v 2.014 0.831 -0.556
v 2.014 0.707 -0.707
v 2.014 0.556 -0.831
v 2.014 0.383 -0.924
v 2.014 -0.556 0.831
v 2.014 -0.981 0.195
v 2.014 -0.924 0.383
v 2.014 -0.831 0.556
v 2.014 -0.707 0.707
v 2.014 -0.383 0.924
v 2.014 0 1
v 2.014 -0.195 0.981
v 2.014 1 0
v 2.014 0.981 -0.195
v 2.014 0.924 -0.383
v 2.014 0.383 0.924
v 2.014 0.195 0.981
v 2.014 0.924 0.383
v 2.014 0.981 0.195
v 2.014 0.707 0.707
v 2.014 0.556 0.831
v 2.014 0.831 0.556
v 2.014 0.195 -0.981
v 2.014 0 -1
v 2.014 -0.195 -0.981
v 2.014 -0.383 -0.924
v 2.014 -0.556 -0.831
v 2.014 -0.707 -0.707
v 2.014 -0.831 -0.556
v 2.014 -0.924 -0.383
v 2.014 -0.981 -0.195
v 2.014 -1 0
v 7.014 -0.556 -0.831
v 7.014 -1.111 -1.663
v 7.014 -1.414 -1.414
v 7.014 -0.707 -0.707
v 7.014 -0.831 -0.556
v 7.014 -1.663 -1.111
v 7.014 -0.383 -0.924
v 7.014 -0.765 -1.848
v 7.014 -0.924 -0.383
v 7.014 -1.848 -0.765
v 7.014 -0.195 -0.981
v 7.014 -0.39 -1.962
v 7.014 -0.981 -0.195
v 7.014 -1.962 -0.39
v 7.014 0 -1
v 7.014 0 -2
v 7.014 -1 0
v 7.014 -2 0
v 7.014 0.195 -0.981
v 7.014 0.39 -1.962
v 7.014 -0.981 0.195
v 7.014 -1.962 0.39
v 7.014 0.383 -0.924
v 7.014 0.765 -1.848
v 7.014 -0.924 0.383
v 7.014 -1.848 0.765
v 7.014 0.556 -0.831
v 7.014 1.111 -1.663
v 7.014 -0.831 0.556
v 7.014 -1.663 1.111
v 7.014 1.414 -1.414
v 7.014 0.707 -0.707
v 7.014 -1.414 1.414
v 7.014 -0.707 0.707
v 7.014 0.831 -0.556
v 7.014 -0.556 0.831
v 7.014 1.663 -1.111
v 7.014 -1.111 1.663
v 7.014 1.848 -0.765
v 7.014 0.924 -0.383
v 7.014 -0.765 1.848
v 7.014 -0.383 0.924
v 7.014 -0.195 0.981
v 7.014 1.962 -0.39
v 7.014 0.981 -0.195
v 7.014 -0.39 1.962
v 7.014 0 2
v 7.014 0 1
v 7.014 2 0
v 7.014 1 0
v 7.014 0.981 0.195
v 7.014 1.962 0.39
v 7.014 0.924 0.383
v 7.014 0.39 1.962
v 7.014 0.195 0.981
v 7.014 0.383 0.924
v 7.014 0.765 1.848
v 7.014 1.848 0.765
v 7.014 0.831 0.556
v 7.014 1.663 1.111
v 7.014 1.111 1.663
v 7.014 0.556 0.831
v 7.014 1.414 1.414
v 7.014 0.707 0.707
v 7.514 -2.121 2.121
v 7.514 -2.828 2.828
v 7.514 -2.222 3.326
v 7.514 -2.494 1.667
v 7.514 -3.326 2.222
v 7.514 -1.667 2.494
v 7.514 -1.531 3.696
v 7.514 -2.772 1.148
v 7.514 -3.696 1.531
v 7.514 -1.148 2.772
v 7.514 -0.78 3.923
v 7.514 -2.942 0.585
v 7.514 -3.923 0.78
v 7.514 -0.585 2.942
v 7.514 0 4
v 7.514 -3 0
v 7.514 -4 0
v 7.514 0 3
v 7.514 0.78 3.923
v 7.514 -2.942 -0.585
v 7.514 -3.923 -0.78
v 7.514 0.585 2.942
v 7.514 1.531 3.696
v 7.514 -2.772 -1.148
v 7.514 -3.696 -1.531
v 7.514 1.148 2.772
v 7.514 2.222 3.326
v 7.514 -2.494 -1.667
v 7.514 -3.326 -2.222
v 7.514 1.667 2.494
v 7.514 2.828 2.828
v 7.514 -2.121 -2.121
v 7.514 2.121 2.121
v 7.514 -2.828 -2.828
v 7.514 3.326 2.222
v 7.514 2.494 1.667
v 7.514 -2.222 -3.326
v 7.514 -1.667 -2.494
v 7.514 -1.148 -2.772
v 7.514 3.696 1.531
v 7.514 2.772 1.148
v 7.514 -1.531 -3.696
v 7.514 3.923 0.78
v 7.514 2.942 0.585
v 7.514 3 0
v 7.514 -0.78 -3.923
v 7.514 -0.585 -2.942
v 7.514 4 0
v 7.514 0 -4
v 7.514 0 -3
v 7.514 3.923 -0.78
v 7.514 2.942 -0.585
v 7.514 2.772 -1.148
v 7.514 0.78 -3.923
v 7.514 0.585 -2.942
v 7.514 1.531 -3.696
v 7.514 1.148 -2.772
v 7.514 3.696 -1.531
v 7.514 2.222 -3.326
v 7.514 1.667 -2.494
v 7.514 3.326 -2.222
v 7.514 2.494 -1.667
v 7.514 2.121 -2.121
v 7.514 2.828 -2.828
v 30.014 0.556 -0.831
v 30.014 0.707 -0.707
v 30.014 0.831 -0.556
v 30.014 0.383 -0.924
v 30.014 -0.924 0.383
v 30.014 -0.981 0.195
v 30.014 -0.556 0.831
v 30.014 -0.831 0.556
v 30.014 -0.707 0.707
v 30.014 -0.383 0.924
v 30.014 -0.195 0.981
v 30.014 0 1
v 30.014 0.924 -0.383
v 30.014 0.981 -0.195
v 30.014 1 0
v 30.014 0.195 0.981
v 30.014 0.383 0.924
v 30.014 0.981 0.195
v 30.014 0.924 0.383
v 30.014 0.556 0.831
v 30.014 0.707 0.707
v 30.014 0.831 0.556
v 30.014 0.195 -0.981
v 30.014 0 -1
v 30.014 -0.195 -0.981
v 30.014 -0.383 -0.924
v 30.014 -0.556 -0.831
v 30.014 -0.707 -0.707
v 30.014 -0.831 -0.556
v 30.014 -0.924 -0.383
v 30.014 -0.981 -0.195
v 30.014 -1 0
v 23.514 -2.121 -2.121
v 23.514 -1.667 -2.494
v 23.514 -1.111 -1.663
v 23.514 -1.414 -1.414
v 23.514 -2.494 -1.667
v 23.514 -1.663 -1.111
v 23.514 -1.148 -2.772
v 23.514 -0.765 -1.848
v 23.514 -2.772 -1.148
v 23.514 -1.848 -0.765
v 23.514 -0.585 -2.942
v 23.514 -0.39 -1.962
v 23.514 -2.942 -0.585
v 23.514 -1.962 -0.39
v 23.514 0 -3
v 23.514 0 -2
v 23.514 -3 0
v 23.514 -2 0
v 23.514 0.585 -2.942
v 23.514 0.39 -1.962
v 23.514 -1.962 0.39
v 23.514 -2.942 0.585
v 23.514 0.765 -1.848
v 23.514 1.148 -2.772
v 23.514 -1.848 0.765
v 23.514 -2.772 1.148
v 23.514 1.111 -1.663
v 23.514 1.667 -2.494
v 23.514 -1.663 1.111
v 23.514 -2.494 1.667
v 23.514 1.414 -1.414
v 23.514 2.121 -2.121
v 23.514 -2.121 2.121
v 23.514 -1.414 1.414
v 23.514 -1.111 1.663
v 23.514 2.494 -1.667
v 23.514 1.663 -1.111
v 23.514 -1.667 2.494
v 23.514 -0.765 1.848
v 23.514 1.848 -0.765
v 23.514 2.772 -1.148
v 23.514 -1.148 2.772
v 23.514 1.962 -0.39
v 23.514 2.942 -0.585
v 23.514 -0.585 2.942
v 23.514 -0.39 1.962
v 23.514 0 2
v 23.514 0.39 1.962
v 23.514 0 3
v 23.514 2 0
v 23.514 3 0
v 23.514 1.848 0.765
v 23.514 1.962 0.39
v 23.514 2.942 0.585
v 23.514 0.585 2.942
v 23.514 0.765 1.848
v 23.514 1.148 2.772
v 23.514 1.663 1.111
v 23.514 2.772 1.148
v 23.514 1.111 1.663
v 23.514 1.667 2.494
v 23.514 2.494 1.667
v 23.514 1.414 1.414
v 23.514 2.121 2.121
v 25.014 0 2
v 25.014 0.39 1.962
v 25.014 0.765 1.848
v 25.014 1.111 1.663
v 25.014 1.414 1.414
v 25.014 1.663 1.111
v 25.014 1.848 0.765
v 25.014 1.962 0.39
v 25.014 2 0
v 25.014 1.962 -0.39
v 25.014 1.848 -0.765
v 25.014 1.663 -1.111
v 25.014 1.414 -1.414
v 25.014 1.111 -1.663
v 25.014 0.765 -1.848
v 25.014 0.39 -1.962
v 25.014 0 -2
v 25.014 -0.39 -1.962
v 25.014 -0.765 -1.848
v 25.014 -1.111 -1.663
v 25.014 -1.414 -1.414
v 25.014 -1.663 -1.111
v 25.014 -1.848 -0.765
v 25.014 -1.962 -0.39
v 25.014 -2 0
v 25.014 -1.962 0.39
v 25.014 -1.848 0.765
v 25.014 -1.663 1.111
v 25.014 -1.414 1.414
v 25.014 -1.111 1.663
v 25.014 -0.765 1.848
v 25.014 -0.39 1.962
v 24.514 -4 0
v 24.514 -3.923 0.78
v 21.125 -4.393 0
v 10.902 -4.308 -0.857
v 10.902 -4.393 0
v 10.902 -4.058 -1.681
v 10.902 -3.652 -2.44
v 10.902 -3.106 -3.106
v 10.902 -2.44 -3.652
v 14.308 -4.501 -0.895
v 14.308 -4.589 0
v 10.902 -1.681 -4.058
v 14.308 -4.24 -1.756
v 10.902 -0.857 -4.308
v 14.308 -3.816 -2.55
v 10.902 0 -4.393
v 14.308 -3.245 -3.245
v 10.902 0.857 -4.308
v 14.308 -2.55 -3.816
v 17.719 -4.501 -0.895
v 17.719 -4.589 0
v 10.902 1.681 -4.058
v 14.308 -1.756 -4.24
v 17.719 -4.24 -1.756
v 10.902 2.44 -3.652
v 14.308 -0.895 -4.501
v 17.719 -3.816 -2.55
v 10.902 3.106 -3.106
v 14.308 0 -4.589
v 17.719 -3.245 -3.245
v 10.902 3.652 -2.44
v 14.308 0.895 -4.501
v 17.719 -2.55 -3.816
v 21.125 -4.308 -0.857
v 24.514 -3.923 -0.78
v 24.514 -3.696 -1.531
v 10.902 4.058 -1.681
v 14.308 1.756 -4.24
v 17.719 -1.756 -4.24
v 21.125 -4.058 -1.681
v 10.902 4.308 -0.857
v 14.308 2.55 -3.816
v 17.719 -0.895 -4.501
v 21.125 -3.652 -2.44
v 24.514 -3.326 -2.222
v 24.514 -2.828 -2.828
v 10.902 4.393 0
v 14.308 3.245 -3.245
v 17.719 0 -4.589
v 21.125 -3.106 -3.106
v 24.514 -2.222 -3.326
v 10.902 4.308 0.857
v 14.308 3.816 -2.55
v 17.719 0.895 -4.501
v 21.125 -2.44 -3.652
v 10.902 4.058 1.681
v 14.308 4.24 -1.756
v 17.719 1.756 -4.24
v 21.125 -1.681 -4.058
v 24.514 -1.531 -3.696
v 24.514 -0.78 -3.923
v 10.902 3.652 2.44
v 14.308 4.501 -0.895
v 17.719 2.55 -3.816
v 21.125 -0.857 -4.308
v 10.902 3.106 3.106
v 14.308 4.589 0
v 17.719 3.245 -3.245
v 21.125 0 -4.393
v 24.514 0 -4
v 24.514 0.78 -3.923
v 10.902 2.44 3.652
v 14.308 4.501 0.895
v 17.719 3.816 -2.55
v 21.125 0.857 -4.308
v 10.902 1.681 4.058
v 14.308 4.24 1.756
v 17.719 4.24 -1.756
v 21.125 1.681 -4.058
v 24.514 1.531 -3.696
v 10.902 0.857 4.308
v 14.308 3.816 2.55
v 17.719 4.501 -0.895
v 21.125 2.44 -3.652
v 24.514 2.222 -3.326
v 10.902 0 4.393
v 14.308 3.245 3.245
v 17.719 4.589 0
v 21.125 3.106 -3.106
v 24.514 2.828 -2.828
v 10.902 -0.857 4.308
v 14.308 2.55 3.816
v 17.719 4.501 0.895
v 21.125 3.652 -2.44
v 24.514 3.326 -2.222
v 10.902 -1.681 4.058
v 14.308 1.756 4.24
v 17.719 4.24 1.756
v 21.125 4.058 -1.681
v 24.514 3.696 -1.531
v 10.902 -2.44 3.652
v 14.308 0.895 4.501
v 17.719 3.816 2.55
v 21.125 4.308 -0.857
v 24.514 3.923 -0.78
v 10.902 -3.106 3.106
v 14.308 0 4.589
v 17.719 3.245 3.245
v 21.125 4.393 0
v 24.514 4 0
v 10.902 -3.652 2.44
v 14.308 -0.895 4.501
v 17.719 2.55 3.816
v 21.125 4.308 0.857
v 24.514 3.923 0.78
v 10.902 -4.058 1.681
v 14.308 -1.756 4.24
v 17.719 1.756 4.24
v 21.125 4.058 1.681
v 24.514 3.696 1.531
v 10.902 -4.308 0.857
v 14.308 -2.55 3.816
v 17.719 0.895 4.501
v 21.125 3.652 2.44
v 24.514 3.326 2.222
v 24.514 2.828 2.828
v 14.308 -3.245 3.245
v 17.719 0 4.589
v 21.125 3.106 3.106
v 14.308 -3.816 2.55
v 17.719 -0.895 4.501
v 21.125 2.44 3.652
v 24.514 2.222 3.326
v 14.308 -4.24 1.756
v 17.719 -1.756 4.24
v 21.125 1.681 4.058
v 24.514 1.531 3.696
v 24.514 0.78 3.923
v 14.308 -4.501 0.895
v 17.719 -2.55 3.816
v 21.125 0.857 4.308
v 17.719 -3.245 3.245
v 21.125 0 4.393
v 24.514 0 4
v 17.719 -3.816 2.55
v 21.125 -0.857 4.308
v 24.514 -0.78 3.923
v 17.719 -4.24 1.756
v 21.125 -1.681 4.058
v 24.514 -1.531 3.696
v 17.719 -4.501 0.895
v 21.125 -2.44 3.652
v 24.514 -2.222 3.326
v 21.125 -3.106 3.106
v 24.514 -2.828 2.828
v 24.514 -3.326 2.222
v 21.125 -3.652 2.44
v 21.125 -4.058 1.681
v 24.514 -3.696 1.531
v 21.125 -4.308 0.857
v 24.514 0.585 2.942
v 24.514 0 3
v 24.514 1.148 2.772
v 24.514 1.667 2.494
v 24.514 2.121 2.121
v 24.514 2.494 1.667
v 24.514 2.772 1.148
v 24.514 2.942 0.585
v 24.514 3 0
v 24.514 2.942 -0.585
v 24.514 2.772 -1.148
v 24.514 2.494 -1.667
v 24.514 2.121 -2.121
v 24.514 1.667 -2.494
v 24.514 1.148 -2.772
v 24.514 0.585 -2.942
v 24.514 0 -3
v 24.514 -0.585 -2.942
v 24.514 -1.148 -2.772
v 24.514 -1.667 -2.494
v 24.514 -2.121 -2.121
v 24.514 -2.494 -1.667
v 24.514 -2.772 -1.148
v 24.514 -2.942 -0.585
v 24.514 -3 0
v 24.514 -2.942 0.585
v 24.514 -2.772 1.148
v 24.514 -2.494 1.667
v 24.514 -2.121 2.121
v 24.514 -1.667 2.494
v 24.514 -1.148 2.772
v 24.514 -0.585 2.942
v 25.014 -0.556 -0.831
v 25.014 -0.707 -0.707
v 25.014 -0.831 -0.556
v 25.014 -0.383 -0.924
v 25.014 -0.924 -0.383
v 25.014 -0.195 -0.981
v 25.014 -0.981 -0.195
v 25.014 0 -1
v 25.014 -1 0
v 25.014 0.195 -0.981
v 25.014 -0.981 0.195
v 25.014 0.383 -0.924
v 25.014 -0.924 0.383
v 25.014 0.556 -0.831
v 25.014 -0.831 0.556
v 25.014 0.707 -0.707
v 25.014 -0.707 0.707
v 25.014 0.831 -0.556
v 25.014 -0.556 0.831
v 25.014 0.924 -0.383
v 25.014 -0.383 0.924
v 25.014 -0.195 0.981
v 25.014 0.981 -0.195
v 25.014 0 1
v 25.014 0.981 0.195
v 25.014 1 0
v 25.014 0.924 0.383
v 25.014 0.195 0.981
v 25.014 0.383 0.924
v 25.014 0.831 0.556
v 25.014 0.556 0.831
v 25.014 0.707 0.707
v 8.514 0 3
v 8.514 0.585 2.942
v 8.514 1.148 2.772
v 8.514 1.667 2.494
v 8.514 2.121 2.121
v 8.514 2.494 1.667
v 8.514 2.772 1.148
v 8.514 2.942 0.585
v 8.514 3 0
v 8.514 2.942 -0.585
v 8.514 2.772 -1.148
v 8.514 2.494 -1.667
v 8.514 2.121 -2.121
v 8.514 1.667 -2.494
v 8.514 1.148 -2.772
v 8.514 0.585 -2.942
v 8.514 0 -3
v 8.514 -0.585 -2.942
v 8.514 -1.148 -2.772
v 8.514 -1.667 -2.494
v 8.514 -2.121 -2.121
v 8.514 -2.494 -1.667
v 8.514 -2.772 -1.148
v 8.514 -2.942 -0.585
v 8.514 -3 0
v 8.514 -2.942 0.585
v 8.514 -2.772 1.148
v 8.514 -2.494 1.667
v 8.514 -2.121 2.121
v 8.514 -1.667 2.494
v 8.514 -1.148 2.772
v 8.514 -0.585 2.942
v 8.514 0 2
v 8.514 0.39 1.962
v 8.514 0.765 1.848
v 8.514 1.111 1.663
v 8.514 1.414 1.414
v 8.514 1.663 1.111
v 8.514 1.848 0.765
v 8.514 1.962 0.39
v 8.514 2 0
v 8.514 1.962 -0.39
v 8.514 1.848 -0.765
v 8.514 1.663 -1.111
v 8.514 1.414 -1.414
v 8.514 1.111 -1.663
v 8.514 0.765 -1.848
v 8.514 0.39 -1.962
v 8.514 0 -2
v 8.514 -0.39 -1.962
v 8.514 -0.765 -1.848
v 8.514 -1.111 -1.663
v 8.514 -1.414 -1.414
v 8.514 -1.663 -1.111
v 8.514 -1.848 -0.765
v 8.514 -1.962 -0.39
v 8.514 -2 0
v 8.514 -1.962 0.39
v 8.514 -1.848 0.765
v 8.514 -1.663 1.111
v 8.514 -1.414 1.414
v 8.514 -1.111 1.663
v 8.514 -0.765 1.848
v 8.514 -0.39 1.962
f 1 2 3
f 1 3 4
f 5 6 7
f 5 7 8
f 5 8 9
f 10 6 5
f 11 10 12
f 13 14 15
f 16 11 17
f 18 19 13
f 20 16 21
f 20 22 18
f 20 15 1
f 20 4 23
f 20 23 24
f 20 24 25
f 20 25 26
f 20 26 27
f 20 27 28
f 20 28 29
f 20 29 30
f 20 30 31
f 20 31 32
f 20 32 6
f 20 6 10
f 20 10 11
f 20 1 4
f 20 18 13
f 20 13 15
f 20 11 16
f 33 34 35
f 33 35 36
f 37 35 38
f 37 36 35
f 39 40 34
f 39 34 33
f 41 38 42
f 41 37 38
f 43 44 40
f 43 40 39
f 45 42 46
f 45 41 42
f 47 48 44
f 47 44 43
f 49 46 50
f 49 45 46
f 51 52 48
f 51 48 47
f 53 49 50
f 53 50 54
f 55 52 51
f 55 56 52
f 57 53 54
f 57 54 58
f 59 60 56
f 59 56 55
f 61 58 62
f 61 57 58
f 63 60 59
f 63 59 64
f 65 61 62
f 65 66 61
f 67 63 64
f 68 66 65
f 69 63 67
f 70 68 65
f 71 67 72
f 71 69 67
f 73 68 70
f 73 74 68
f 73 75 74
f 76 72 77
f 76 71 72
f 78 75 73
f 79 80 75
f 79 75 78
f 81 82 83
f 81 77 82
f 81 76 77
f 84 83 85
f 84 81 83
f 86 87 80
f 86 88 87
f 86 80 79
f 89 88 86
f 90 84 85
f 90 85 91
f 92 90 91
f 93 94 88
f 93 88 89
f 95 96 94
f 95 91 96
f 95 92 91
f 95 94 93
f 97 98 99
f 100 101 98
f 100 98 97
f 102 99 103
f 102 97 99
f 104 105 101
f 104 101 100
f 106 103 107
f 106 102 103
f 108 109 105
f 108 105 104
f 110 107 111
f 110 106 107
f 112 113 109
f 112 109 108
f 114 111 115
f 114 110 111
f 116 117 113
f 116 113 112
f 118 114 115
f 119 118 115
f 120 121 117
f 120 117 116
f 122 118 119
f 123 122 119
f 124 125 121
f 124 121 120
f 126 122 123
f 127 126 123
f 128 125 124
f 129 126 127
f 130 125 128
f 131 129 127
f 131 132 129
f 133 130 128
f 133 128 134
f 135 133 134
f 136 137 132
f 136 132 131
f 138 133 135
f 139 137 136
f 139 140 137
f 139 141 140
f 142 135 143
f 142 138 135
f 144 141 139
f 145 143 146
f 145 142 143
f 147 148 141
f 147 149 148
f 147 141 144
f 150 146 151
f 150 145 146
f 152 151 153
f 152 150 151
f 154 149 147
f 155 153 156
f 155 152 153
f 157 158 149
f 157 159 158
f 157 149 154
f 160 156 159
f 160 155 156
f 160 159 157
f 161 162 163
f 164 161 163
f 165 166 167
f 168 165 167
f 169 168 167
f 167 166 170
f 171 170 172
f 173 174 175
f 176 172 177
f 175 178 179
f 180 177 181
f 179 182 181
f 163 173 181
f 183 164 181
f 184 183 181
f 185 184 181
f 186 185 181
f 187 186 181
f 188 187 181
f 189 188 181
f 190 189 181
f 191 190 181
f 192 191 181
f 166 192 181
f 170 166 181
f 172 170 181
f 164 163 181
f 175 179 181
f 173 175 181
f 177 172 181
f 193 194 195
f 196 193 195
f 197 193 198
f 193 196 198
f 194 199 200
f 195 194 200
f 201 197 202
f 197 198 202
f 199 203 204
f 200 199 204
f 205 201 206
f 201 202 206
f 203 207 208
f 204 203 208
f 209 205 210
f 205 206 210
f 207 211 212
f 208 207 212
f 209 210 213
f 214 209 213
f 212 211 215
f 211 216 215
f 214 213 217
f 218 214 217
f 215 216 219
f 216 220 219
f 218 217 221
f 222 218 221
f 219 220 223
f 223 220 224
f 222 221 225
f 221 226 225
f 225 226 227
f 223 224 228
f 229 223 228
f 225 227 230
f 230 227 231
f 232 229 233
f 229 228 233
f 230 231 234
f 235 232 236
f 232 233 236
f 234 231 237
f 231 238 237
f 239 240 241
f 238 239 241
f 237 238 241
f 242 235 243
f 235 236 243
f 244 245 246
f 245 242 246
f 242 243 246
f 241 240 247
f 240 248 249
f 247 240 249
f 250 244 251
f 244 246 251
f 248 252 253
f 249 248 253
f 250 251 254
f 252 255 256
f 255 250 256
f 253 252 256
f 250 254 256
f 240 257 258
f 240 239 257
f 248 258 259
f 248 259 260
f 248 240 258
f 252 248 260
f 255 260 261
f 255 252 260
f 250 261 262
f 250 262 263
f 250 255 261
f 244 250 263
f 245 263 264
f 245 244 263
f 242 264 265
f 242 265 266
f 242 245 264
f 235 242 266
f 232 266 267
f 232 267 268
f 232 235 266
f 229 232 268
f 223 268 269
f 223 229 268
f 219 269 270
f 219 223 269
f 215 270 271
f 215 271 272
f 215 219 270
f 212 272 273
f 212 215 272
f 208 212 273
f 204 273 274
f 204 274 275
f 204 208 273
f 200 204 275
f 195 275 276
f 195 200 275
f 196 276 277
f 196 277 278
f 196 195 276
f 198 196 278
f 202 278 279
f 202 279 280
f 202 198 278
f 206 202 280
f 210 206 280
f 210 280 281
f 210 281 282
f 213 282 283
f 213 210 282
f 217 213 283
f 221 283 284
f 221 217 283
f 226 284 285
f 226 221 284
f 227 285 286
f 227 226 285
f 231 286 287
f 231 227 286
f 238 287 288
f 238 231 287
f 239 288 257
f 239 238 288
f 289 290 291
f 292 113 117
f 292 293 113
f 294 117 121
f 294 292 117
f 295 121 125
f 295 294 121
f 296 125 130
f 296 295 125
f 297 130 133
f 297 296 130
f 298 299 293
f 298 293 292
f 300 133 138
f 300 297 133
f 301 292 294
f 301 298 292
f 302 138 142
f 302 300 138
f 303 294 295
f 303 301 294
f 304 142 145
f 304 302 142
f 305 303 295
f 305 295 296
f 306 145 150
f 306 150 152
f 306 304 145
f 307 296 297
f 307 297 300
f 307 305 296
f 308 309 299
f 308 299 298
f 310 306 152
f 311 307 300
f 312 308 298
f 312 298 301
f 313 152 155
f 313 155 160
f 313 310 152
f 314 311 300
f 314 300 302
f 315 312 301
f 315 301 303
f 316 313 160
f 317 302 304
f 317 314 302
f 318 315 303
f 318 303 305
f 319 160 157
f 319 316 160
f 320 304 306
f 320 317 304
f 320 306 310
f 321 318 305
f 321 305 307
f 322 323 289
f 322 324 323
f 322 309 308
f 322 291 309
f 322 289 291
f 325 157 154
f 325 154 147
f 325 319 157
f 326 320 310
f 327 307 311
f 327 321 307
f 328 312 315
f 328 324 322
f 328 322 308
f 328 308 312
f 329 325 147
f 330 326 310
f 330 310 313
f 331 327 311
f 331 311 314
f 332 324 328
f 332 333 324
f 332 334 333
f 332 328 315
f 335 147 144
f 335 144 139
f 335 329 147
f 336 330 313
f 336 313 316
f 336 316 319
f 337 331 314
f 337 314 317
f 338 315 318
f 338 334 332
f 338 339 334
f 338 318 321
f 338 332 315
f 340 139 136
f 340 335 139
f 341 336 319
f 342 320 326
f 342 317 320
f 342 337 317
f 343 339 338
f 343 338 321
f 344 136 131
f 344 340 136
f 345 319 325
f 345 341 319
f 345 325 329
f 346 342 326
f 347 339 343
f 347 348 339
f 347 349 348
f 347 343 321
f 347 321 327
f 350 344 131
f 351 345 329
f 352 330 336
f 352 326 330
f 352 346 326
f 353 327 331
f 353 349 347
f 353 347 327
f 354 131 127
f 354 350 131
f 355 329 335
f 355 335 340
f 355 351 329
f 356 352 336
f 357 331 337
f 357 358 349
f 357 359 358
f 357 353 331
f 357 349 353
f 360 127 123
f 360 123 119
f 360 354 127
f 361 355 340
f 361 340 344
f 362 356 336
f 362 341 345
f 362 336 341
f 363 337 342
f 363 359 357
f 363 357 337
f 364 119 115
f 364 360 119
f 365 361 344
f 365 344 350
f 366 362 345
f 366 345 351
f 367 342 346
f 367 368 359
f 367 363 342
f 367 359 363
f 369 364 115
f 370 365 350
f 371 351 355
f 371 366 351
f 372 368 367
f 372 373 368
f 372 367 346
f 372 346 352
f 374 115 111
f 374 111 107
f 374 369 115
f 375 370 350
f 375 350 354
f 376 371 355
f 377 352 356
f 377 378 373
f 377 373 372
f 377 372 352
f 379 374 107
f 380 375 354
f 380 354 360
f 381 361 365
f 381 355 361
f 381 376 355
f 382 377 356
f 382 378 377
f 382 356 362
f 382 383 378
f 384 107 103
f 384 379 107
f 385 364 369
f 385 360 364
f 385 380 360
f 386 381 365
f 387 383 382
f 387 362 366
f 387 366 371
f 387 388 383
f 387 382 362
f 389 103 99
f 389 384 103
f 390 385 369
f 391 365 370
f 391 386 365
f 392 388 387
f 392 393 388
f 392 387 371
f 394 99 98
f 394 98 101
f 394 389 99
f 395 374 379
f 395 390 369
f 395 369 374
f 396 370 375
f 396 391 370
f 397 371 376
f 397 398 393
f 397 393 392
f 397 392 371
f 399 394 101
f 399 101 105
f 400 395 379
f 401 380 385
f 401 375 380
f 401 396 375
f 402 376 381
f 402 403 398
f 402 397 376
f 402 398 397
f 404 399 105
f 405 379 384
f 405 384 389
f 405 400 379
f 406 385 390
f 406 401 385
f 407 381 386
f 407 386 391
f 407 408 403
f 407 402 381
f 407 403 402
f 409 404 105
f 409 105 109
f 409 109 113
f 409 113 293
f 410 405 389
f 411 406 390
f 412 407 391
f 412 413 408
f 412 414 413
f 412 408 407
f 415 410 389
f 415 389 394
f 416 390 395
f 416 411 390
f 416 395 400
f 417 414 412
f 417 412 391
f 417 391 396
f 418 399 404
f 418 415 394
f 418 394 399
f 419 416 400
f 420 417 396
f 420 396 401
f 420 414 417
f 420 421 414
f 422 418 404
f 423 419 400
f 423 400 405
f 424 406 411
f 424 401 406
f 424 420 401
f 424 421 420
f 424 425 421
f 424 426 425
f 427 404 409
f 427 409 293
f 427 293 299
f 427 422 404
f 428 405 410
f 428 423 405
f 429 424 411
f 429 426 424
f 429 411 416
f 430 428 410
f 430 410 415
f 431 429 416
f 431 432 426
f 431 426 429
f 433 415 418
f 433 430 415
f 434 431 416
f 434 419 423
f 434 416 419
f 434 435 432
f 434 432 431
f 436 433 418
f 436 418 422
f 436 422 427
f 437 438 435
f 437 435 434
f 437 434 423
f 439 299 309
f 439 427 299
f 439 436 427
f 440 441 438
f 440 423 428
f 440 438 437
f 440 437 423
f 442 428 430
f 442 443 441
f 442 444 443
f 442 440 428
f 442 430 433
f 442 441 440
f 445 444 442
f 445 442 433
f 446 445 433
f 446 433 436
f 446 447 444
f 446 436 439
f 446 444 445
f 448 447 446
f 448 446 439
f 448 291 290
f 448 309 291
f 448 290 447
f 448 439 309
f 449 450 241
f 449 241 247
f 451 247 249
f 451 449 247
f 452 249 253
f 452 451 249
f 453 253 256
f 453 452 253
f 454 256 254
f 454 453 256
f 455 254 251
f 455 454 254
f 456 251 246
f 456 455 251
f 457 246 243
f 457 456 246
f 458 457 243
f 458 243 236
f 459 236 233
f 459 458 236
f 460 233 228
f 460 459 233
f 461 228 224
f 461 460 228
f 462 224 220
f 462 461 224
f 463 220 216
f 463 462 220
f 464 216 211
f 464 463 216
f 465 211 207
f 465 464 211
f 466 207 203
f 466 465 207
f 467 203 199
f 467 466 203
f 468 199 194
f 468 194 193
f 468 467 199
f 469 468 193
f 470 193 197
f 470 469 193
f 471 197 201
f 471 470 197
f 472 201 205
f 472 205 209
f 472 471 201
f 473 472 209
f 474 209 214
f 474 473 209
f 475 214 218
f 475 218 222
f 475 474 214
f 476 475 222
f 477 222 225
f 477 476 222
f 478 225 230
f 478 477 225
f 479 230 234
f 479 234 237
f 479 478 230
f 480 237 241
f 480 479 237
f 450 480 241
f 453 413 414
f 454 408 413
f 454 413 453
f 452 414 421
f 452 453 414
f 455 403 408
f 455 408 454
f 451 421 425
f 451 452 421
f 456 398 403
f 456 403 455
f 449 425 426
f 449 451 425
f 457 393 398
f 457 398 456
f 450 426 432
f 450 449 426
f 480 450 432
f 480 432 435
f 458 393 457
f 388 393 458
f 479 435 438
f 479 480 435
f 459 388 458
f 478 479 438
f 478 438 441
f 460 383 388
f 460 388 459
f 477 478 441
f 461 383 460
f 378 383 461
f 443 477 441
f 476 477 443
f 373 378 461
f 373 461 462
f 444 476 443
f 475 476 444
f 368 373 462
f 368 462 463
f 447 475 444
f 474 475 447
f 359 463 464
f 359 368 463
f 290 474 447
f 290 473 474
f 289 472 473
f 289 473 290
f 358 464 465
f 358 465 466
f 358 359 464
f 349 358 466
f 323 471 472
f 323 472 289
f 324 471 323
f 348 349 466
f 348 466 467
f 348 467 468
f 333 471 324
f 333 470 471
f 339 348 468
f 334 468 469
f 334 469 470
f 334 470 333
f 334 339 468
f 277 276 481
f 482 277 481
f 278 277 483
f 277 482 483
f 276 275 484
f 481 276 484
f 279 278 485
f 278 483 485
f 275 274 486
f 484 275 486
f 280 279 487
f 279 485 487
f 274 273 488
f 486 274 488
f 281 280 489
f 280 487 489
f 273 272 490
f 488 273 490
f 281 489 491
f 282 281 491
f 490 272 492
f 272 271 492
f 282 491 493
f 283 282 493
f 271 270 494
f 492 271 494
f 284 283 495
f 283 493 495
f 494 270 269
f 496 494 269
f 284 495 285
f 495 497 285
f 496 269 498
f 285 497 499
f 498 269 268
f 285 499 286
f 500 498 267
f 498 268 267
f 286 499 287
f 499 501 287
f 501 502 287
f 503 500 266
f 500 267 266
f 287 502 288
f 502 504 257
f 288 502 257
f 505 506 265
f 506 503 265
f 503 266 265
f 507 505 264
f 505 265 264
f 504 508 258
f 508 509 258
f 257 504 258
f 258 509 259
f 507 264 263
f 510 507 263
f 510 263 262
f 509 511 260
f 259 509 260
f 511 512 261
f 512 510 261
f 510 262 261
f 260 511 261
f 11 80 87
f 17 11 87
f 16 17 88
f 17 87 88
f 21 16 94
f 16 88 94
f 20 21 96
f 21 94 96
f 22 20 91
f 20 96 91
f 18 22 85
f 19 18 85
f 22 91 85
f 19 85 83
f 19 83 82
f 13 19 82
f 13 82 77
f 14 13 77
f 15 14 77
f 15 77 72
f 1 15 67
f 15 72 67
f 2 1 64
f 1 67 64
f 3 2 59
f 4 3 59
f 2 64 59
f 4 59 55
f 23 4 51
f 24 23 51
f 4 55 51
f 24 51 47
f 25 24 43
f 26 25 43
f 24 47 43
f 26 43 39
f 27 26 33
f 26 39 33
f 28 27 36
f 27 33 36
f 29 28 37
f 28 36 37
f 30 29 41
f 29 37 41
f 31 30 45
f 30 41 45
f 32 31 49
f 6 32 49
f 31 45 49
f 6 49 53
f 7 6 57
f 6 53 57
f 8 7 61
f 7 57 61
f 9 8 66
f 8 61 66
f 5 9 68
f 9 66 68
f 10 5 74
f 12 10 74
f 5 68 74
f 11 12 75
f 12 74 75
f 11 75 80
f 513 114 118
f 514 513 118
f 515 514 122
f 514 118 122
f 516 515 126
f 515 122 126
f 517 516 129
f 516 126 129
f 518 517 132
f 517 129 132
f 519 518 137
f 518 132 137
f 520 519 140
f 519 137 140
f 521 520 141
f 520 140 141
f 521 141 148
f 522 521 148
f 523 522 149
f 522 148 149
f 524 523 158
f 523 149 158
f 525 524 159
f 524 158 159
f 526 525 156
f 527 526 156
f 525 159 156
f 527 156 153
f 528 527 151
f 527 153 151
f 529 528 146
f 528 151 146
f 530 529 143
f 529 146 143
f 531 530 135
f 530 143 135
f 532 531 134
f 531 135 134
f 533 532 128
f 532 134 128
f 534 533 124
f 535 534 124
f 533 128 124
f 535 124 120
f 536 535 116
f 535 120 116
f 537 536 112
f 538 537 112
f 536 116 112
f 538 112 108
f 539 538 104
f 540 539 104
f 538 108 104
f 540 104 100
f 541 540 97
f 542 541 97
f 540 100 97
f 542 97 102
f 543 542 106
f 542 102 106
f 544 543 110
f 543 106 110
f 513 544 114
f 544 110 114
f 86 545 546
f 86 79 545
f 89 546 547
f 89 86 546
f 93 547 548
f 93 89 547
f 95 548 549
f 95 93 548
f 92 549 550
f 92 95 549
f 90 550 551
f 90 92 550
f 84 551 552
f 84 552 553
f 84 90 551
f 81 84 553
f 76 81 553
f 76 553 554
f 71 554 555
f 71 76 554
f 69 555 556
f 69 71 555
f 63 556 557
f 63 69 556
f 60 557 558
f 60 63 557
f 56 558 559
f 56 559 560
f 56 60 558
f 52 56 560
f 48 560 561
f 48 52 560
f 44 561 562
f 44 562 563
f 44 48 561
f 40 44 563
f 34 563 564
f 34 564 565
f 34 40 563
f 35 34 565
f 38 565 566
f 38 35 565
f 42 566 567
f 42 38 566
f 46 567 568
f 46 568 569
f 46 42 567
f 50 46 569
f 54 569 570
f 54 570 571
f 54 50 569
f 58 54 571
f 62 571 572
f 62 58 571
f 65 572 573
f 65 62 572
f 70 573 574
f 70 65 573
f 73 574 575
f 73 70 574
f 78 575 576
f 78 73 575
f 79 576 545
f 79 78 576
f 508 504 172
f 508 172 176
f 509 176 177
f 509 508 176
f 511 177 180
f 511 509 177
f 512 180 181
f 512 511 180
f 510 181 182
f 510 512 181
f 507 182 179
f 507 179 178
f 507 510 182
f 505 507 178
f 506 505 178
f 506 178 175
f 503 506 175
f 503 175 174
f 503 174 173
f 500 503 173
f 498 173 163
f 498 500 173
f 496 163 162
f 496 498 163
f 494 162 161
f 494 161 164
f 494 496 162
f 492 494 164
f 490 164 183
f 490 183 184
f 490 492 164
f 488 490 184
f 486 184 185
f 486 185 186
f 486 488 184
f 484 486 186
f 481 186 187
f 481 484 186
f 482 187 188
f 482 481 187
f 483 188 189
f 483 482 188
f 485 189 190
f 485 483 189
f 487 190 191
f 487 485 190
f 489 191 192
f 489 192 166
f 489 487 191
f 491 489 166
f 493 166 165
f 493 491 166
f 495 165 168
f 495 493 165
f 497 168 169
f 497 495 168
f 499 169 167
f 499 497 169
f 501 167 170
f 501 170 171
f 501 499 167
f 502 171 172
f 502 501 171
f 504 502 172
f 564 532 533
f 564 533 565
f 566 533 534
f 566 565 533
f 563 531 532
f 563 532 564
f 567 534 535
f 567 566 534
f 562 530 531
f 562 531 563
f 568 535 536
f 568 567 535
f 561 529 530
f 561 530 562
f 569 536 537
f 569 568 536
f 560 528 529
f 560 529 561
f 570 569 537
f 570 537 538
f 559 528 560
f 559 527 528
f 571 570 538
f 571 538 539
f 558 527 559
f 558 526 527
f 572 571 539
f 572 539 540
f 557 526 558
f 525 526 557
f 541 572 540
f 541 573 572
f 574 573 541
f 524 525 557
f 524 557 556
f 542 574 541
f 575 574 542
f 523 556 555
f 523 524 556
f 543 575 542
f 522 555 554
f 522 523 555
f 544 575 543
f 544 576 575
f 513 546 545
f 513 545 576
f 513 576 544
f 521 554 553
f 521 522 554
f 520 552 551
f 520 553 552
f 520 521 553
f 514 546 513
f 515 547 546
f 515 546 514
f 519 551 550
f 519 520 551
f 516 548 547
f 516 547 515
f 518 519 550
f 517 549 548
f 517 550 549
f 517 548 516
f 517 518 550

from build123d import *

# Parameters (mm, degrees)
SKETCH_2_R          = 3
SKETCH_2_R_2        = 2
CUT_EXTRUDE_1_DEPTH = 1
SKETCH_3_R          = 2
EXTRUDE_1_DEPTH     = 0.5
SKETCH_5_R          = 1
EXTRUDE_3_DEPTH     = 5


with BuildPart() as part:
    # 草图1 → 旋转2 (revolve)
    with BuildSketch(Plane.XY):
        with BuildLine():
            Line((7.513582187, 0), (7.513582187, -4))
            ThreePointArc((7.513582187, -4), (16.013582187, -4.614003224), (24.513582187, -4))
            Line((24.513582187, -4), (24.513582187, 0))
            Line((24.513582187, 0), (7.513582187, 0))
        make_face()
    revolve(axis=Axis((7.513582187, 0, 0), (1, 0, 0)))

    # 草图2 → 切除-拉伸1 (cut)
    with BuildSketch(Plane.ZY.offset(-7.513582187)):
        Circle(SKETCH_2_R)
        Circle(SKETCH_2_R_2, mode=Mode.SUBTRACT)
    cut_extrude_1 = extrude(amount=-CUT_EXTRUDE_1_DEPTH, mode=Mode.SUBTRACT)

    # 草图3 → 凸台-拉伸1 (add)
    with BuildSketch(Plane.ZY.offset(-7.513582187)):
        Circle(SKETCH_3_R)
    extrude_1 = extrude(amount=EXTRUDE_1_DEPTH)

    # 草图5 → 凸台-拉伸3 (add)
    with BuildSketch(Plane.ZY.offset(-7.013582187)):
        Circle(SKETCH_5_R)
    extrude_3 = extrude(amount=EXTRUDE_3_DEPTH)

    # 镜向4: 切除-拉伸1, 凸台-拉伸1, 凸台-拉伸3 across plane
    add(cut_extrude_1.mirror(Plane.ZY.offset(-16.013582187)), mode=Mode.SUBTRACT)
    add(extrude_1.mirror(Plane.ZY.offset(-16.013582187)))
    add(extrude_3.mirror(Plane.ZY.offset(-16.013582187)))


solid = part.part
